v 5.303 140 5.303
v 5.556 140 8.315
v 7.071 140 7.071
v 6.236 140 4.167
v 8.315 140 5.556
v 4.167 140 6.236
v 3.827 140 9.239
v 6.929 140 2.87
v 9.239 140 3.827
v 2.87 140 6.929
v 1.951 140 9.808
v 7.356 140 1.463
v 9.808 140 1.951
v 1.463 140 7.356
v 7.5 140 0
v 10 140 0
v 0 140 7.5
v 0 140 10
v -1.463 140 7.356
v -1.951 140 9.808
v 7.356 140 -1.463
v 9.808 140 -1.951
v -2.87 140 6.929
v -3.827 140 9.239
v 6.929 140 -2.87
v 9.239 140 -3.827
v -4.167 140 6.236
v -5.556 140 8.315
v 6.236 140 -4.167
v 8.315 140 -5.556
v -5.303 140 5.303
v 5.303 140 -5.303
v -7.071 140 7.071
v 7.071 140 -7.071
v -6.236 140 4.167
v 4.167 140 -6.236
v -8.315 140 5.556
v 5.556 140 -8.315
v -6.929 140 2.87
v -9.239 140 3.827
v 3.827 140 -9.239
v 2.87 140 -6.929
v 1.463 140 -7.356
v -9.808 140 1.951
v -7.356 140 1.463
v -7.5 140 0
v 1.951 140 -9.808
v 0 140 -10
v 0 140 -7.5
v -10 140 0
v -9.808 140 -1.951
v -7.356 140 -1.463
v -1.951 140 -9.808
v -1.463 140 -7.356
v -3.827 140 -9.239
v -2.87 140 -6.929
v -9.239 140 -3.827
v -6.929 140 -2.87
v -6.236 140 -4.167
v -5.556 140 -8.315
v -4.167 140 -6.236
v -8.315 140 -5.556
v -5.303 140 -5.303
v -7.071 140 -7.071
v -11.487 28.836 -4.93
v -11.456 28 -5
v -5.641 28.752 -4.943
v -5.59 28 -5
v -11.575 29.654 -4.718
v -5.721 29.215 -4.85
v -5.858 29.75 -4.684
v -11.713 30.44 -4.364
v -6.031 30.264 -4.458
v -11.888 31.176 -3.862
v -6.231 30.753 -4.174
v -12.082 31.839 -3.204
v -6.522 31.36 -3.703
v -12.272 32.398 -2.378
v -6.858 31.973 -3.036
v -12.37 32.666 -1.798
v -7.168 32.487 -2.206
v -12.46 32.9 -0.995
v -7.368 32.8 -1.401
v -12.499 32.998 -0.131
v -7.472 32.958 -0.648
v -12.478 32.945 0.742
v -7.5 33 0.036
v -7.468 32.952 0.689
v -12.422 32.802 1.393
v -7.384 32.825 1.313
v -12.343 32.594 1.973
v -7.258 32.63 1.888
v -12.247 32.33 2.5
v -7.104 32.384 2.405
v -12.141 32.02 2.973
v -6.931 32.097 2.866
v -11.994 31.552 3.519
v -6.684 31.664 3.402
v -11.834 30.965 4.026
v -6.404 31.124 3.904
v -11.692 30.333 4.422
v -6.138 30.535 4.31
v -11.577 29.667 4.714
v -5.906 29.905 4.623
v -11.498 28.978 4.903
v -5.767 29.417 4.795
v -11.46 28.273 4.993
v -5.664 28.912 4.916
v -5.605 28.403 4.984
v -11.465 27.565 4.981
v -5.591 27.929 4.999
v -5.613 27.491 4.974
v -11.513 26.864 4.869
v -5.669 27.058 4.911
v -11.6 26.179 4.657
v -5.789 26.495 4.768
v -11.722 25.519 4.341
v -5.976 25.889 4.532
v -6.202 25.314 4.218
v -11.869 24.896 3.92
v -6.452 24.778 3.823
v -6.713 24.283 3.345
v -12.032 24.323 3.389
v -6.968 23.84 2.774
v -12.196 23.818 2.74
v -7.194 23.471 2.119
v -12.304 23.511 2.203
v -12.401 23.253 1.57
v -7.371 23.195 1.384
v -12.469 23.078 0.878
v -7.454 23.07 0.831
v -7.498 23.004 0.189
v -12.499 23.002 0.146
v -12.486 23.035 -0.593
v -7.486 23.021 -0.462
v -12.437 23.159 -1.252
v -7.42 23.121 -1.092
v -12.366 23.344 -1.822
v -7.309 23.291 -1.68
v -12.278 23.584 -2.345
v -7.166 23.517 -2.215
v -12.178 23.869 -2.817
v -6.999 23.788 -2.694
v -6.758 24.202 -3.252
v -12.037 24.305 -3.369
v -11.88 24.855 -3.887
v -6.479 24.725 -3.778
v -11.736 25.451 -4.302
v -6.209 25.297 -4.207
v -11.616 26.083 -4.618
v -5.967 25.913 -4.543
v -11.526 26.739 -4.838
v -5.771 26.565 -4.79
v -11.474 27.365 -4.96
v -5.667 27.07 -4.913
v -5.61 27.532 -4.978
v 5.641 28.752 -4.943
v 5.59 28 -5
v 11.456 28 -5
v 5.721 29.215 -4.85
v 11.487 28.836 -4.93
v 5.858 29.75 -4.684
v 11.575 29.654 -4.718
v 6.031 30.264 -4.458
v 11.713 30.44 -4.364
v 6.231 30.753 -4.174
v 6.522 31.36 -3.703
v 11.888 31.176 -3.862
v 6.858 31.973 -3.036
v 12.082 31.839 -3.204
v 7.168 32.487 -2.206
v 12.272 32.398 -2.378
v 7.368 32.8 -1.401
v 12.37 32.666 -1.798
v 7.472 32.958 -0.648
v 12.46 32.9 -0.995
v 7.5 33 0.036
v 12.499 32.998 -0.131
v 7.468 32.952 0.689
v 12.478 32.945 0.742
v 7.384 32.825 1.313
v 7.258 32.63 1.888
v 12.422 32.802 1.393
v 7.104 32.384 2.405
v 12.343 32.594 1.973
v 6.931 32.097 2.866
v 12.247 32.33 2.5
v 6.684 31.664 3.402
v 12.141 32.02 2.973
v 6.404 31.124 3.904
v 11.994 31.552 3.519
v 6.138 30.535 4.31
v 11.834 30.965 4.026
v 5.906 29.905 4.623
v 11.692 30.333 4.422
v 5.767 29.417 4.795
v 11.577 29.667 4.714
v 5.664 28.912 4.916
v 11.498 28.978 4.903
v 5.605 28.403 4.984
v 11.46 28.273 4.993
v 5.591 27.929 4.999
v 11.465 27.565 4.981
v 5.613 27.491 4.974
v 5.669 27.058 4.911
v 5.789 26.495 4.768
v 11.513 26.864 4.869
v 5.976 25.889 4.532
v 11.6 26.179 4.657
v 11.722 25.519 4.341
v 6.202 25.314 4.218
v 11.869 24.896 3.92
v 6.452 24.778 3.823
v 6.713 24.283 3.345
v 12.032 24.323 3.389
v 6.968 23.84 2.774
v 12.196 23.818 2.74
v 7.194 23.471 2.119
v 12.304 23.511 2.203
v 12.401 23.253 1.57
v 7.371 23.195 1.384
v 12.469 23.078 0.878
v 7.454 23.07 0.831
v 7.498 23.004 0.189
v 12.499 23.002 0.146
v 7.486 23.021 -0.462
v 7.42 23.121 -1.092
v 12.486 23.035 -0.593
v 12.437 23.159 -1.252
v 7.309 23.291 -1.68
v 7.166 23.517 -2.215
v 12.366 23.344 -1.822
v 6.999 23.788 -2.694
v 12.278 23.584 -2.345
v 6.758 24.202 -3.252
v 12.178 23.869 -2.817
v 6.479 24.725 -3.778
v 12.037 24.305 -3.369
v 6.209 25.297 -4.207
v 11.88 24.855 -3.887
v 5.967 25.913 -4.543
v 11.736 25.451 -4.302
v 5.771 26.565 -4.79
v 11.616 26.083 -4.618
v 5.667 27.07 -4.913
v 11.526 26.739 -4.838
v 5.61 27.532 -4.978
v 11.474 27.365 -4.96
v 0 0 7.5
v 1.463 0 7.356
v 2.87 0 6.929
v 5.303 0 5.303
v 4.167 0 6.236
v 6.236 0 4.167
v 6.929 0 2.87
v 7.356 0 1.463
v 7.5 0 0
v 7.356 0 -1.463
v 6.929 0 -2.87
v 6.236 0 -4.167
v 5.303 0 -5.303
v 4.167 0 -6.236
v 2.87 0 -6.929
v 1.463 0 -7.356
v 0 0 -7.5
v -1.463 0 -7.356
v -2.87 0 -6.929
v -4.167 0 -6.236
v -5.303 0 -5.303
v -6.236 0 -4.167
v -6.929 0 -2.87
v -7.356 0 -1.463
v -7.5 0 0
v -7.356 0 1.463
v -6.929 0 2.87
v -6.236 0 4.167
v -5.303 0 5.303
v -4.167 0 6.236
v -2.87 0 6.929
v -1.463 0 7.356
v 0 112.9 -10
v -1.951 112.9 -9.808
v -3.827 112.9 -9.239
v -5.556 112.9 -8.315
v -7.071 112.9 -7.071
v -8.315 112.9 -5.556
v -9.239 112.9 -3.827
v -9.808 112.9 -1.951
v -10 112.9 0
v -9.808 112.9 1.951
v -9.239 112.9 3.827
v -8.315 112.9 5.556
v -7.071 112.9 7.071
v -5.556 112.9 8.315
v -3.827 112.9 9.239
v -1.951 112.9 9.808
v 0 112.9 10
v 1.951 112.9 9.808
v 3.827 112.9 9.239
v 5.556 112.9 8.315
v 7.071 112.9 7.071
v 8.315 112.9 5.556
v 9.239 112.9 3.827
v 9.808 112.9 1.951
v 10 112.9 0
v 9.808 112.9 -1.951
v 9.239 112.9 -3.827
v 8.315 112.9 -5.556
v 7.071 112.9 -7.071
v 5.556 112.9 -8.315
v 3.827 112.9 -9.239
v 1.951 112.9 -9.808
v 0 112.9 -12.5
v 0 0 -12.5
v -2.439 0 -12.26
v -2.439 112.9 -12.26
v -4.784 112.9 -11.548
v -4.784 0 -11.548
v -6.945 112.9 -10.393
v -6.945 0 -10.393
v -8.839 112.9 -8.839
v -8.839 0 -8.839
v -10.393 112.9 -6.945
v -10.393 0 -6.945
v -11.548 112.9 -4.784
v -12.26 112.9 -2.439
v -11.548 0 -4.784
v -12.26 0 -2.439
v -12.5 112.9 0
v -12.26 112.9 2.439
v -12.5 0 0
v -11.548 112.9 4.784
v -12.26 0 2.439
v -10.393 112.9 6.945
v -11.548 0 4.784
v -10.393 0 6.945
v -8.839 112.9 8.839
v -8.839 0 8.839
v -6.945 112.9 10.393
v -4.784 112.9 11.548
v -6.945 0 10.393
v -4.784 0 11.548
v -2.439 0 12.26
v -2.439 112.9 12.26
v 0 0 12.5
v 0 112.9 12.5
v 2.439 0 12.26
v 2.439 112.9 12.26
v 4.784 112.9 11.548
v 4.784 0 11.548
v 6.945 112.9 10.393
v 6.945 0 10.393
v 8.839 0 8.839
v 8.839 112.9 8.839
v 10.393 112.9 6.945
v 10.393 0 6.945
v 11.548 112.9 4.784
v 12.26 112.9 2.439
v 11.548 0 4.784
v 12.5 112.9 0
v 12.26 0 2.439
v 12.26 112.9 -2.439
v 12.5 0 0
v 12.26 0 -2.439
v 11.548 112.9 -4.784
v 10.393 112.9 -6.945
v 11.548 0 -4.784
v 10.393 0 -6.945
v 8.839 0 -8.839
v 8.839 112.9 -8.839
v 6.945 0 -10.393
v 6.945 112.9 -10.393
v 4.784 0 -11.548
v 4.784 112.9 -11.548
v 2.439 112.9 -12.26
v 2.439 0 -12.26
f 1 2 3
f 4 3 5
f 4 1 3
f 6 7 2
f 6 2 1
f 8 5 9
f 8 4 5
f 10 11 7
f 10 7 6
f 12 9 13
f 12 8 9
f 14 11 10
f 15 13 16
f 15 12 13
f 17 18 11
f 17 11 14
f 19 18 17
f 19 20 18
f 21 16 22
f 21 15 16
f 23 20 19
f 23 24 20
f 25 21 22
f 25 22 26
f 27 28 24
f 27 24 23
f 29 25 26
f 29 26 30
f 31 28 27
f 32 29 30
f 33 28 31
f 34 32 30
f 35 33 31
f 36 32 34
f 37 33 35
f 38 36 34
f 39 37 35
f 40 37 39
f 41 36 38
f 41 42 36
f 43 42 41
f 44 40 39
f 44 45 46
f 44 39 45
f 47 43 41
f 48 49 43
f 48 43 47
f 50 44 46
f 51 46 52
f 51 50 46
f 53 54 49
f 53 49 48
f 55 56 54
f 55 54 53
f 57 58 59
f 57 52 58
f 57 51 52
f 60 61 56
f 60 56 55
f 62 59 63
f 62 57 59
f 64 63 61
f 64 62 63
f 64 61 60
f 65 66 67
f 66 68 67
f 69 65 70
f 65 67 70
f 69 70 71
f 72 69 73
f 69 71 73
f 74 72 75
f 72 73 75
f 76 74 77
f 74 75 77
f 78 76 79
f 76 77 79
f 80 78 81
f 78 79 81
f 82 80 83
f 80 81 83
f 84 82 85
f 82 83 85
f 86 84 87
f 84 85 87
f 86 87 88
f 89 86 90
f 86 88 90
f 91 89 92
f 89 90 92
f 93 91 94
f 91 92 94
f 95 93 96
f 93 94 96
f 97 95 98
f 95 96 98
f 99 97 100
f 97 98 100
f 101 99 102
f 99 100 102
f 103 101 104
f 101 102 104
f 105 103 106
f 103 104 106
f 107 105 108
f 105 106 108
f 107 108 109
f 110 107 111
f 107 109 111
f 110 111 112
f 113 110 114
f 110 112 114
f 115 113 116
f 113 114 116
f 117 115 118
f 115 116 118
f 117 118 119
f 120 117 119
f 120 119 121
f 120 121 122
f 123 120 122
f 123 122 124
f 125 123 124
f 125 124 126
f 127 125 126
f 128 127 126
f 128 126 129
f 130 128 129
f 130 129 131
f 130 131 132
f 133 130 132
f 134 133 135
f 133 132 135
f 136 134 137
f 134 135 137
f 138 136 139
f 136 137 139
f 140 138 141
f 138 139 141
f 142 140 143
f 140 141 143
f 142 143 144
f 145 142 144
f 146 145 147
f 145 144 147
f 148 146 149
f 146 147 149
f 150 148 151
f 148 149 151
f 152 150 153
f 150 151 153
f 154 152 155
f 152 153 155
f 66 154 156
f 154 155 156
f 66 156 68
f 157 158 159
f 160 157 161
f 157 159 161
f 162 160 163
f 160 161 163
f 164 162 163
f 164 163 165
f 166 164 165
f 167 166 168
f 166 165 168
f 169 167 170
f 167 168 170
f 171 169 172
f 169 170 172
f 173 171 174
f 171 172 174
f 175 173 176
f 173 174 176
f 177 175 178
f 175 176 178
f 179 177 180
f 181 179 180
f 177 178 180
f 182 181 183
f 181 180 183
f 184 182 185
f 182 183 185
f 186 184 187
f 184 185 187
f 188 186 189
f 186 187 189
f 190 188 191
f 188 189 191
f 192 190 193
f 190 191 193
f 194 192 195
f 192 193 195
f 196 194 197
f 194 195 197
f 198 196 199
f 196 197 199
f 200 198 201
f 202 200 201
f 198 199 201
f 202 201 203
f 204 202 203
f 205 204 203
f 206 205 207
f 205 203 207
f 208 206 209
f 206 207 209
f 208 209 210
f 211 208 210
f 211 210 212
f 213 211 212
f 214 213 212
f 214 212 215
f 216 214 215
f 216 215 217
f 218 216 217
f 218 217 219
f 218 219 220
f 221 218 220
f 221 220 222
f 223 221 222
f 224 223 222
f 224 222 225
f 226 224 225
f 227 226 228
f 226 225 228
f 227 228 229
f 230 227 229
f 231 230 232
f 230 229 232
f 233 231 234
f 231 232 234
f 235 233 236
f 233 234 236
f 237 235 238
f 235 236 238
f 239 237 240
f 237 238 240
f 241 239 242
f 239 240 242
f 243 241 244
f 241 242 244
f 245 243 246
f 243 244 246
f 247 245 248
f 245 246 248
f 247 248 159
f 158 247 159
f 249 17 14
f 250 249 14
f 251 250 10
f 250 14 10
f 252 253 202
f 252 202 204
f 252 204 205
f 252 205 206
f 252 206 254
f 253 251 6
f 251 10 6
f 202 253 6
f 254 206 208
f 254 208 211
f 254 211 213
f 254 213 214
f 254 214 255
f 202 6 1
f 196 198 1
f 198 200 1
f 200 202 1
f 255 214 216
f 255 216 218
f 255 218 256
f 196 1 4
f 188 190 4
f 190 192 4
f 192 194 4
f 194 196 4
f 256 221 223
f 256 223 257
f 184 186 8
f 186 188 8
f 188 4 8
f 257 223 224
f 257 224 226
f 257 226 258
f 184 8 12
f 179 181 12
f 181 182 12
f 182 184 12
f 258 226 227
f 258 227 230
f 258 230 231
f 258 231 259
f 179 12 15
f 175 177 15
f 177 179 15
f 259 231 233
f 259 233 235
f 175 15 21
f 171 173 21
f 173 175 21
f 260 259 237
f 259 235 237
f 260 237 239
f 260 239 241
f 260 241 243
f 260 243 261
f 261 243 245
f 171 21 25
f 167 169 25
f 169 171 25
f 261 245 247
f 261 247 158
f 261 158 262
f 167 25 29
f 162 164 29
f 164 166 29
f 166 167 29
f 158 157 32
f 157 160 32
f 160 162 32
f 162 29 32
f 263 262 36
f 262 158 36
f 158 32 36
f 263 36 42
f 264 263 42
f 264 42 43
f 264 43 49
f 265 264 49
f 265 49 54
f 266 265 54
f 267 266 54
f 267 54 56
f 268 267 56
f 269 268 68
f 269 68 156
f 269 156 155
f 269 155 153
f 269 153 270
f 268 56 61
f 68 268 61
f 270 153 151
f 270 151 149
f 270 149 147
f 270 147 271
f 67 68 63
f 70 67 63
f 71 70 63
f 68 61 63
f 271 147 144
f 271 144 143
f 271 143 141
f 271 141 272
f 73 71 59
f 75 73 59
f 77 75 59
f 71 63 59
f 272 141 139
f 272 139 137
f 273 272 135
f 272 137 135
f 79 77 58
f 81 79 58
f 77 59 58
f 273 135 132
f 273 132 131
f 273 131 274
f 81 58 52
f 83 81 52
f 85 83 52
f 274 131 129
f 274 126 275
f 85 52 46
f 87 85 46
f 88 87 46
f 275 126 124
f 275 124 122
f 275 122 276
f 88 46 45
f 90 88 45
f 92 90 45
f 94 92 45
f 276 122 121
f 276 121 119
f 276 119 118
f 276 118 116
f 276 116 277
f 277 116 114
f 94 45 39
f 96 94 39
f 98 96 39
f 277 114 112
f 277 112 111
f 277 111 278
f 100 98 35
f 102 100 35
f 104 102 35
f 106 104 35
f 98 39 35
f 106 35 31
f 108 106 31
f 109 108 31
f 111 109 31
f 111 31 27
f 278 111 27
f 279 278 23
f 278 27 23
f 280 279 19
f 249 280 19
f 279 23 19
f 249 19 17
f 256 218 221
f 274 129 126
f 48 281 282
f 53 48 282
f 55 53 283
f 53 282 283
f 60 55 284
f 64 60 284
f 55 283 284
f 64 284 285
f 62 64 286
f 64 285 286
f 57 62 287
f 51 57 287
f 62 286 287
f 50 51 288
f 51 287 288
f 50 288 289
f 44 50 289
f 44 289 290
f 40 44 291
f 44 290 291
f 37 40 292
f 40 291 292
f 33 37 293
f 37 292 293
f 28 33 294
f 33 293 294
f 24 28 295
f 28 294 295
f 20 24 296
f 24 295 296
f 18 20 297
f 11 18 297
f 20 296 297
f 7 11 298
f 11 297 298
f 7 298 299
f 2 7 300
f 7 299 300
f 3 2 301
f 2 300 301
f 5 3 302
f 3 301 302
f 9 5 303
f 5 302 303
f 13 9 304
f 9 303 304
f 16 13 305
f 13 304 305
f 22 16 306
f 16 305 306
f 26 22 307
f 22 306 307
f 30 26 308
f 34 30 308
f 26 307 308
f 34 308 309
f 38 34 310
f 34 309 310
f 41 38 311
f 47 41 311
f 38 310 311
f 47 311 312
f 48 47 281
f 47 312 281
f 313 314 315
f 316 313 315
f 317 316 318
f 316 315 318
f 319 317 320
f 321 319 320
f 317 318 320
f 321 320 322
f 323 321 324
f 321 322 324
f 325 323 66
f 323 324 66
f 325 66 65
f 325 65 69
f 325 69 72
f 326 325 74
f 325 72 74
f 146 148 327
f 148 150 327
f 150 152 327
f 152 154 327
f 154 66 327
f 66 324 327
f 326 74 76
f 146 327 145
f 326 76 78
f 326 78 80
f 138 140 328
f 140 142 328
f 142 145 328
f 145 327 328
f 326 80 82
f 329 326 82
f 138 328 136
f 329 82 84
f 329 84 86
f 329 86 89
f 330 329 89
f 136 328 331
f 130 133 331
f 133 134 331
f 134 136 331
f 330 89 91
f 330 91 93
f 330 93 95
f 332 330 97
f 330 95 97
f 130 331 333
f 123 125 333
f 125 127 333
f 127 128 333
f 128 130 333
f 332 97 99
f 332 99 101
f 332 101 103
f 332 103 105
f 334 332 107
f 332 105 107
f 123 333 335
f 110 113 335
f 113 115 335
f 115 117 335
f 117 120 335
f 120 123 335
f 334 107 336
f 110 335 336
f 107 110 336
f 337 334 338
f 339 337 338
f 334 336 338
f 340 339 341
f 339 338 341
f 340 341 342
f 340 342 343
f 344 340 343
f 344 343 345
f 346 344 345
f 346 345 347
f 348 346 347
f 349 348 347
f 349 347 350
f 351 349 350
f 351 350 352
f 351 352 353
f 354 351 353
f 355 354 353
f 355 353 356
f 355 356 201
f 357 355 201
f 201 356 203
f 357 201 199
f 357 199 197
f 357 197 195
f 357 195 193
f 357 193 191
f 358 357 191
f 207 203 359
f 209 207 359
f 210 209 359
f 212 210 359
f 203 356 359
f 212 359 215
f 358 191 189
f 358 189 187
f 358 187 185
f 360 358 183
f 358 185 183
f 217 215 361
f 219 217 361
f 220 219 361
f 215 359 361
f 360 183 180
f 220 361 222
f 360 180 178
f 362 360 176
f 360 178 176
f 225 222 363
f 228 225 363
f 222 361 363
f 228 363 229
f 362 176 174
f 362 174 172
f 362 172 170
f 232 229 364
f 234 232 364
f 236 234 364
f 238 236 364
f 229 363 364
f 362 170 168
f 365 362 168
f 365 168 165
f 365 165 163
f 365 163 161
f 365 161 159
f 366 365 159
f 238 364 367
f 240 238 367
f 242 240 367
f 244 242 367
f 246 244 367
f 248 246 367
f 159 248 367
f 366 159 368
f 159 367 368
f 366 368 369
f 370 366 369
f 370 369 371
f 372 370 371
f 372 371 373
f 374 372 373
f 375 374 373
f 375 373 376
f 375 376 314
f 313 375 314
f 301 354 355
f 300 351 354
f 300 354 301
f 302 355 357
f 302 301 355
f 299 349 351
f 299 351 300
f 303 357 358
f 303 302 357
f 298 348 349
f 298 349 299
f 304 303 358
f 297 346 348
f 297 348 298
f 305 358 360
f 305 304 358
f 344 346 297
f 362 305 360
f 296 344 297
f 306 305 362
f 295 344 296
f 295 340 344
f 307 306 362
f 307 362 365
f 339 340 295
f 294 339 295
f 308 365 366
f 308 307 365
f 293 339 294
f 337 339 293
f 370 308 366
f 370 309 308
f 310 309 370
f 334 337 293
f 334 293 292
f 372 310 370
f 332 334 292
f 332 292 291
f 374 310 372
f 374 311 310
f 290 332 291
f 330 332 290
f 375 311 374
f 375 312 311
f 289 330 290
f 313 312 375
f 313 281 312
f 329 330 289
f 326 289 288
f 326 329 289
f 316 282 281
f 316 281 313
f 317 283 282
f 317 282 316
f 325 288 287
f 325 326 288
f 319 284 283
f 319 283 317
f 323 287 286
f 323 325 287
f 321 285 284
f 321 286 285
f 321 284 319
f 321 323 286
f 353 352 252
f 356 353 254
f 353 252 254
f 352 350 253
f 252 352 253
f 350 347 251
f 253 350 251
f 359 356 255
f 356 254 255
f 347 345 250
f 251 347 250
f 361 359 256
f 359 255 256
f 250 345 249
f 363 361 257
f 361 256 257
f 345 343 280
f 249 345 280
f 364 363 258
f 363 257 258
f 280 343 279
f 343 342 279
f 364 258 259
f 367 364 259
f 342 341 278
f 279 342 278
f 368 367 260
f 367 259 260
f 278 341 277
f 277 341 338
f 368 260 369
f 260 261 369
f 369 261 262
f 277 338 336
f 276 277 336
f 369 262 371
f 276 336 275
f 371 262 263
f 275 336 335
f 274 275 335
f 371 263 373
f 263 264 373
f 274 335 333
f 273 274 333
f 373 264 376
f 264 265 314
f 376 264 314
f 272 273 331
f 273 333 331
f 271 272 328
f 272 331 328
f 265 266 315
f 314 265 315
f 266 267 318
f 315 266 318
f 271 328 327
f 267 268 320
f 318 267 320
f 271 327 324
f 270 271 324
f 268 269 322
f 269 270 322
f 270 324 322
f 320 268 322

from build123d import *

# Parameters (mm, degrees)
ESBO_O1_R                = 12.5
RESSALTO_EXTRUS_O1_DEPTH = 112.9
ESBO_O2_R                = 10
RESSALTO_EXTRUS_O2_DEPTH = 27.1
ESBO_O3_R                = 7.5
CORTE_EXTRUS_O1_DEPTH    = 142.111657917
ESBO_O5_R                = 5
CORTE_EXTRUS_O2_DEPTH    = 15


with BuildPart() as part:
    # Esboço1 → Ressalto-extrusão1 (new body)
    with BuildSketch(Plane(origin=(0, 0, 0), x_dir=(1, 0, 0), z_dir=(0, 1, 0))):
        with Locations(Location((0, 0, 0), (0, 0, 90))):
            Circle(ESBO_O1_R)
    extrude(amount=RESSALTO_EXTRUS_O1_DEPTH)

    # Esboço2 → Ressalto-extrusão2 (add)
    with BuildSketch(Plane(origin=(0, 112.9, 0), x_dir=(1, 0, 0), z_dir=(0, 1, 0))):
        with Locations(Location((0, 0, 0), (0, 0, 90))):
            Circle(ESBO_O2_R)
    extrude(amount=RESSALTO_EXTRUS_O2_DEPTH)

    # Esboço3 → Corte-extrusão1 (cut, through all)
    with BuildSketch(Plane(origin=(0, 140, 0), x_dir=(1, 0, 0), z_dir=(0, 1, 0))):
        with Locations(Location((0, 0, 0), (0, 0, 270))):
            Circle(ESBO_O3_R)
    extrude(amount=-CORTE_EXTRUS_O1_DEPTH, mode=Mode.SUBTRACT)

    # Esboço5 → Corte-extrusão2 (cut, symmetric)
    with BuildSketch(Plane(origin=(0, 0, 0), x_dir=(0, 0, -1), z_dir=(1, 0, 0))):
        with Locations((0, 28)):
            Circle(ESBO_O5_R)
    extrude(amount=CORTE_EXTRUS_O2_DEPTH, both=True, mode=Mode.SUBTRACT)


solid = part.part
